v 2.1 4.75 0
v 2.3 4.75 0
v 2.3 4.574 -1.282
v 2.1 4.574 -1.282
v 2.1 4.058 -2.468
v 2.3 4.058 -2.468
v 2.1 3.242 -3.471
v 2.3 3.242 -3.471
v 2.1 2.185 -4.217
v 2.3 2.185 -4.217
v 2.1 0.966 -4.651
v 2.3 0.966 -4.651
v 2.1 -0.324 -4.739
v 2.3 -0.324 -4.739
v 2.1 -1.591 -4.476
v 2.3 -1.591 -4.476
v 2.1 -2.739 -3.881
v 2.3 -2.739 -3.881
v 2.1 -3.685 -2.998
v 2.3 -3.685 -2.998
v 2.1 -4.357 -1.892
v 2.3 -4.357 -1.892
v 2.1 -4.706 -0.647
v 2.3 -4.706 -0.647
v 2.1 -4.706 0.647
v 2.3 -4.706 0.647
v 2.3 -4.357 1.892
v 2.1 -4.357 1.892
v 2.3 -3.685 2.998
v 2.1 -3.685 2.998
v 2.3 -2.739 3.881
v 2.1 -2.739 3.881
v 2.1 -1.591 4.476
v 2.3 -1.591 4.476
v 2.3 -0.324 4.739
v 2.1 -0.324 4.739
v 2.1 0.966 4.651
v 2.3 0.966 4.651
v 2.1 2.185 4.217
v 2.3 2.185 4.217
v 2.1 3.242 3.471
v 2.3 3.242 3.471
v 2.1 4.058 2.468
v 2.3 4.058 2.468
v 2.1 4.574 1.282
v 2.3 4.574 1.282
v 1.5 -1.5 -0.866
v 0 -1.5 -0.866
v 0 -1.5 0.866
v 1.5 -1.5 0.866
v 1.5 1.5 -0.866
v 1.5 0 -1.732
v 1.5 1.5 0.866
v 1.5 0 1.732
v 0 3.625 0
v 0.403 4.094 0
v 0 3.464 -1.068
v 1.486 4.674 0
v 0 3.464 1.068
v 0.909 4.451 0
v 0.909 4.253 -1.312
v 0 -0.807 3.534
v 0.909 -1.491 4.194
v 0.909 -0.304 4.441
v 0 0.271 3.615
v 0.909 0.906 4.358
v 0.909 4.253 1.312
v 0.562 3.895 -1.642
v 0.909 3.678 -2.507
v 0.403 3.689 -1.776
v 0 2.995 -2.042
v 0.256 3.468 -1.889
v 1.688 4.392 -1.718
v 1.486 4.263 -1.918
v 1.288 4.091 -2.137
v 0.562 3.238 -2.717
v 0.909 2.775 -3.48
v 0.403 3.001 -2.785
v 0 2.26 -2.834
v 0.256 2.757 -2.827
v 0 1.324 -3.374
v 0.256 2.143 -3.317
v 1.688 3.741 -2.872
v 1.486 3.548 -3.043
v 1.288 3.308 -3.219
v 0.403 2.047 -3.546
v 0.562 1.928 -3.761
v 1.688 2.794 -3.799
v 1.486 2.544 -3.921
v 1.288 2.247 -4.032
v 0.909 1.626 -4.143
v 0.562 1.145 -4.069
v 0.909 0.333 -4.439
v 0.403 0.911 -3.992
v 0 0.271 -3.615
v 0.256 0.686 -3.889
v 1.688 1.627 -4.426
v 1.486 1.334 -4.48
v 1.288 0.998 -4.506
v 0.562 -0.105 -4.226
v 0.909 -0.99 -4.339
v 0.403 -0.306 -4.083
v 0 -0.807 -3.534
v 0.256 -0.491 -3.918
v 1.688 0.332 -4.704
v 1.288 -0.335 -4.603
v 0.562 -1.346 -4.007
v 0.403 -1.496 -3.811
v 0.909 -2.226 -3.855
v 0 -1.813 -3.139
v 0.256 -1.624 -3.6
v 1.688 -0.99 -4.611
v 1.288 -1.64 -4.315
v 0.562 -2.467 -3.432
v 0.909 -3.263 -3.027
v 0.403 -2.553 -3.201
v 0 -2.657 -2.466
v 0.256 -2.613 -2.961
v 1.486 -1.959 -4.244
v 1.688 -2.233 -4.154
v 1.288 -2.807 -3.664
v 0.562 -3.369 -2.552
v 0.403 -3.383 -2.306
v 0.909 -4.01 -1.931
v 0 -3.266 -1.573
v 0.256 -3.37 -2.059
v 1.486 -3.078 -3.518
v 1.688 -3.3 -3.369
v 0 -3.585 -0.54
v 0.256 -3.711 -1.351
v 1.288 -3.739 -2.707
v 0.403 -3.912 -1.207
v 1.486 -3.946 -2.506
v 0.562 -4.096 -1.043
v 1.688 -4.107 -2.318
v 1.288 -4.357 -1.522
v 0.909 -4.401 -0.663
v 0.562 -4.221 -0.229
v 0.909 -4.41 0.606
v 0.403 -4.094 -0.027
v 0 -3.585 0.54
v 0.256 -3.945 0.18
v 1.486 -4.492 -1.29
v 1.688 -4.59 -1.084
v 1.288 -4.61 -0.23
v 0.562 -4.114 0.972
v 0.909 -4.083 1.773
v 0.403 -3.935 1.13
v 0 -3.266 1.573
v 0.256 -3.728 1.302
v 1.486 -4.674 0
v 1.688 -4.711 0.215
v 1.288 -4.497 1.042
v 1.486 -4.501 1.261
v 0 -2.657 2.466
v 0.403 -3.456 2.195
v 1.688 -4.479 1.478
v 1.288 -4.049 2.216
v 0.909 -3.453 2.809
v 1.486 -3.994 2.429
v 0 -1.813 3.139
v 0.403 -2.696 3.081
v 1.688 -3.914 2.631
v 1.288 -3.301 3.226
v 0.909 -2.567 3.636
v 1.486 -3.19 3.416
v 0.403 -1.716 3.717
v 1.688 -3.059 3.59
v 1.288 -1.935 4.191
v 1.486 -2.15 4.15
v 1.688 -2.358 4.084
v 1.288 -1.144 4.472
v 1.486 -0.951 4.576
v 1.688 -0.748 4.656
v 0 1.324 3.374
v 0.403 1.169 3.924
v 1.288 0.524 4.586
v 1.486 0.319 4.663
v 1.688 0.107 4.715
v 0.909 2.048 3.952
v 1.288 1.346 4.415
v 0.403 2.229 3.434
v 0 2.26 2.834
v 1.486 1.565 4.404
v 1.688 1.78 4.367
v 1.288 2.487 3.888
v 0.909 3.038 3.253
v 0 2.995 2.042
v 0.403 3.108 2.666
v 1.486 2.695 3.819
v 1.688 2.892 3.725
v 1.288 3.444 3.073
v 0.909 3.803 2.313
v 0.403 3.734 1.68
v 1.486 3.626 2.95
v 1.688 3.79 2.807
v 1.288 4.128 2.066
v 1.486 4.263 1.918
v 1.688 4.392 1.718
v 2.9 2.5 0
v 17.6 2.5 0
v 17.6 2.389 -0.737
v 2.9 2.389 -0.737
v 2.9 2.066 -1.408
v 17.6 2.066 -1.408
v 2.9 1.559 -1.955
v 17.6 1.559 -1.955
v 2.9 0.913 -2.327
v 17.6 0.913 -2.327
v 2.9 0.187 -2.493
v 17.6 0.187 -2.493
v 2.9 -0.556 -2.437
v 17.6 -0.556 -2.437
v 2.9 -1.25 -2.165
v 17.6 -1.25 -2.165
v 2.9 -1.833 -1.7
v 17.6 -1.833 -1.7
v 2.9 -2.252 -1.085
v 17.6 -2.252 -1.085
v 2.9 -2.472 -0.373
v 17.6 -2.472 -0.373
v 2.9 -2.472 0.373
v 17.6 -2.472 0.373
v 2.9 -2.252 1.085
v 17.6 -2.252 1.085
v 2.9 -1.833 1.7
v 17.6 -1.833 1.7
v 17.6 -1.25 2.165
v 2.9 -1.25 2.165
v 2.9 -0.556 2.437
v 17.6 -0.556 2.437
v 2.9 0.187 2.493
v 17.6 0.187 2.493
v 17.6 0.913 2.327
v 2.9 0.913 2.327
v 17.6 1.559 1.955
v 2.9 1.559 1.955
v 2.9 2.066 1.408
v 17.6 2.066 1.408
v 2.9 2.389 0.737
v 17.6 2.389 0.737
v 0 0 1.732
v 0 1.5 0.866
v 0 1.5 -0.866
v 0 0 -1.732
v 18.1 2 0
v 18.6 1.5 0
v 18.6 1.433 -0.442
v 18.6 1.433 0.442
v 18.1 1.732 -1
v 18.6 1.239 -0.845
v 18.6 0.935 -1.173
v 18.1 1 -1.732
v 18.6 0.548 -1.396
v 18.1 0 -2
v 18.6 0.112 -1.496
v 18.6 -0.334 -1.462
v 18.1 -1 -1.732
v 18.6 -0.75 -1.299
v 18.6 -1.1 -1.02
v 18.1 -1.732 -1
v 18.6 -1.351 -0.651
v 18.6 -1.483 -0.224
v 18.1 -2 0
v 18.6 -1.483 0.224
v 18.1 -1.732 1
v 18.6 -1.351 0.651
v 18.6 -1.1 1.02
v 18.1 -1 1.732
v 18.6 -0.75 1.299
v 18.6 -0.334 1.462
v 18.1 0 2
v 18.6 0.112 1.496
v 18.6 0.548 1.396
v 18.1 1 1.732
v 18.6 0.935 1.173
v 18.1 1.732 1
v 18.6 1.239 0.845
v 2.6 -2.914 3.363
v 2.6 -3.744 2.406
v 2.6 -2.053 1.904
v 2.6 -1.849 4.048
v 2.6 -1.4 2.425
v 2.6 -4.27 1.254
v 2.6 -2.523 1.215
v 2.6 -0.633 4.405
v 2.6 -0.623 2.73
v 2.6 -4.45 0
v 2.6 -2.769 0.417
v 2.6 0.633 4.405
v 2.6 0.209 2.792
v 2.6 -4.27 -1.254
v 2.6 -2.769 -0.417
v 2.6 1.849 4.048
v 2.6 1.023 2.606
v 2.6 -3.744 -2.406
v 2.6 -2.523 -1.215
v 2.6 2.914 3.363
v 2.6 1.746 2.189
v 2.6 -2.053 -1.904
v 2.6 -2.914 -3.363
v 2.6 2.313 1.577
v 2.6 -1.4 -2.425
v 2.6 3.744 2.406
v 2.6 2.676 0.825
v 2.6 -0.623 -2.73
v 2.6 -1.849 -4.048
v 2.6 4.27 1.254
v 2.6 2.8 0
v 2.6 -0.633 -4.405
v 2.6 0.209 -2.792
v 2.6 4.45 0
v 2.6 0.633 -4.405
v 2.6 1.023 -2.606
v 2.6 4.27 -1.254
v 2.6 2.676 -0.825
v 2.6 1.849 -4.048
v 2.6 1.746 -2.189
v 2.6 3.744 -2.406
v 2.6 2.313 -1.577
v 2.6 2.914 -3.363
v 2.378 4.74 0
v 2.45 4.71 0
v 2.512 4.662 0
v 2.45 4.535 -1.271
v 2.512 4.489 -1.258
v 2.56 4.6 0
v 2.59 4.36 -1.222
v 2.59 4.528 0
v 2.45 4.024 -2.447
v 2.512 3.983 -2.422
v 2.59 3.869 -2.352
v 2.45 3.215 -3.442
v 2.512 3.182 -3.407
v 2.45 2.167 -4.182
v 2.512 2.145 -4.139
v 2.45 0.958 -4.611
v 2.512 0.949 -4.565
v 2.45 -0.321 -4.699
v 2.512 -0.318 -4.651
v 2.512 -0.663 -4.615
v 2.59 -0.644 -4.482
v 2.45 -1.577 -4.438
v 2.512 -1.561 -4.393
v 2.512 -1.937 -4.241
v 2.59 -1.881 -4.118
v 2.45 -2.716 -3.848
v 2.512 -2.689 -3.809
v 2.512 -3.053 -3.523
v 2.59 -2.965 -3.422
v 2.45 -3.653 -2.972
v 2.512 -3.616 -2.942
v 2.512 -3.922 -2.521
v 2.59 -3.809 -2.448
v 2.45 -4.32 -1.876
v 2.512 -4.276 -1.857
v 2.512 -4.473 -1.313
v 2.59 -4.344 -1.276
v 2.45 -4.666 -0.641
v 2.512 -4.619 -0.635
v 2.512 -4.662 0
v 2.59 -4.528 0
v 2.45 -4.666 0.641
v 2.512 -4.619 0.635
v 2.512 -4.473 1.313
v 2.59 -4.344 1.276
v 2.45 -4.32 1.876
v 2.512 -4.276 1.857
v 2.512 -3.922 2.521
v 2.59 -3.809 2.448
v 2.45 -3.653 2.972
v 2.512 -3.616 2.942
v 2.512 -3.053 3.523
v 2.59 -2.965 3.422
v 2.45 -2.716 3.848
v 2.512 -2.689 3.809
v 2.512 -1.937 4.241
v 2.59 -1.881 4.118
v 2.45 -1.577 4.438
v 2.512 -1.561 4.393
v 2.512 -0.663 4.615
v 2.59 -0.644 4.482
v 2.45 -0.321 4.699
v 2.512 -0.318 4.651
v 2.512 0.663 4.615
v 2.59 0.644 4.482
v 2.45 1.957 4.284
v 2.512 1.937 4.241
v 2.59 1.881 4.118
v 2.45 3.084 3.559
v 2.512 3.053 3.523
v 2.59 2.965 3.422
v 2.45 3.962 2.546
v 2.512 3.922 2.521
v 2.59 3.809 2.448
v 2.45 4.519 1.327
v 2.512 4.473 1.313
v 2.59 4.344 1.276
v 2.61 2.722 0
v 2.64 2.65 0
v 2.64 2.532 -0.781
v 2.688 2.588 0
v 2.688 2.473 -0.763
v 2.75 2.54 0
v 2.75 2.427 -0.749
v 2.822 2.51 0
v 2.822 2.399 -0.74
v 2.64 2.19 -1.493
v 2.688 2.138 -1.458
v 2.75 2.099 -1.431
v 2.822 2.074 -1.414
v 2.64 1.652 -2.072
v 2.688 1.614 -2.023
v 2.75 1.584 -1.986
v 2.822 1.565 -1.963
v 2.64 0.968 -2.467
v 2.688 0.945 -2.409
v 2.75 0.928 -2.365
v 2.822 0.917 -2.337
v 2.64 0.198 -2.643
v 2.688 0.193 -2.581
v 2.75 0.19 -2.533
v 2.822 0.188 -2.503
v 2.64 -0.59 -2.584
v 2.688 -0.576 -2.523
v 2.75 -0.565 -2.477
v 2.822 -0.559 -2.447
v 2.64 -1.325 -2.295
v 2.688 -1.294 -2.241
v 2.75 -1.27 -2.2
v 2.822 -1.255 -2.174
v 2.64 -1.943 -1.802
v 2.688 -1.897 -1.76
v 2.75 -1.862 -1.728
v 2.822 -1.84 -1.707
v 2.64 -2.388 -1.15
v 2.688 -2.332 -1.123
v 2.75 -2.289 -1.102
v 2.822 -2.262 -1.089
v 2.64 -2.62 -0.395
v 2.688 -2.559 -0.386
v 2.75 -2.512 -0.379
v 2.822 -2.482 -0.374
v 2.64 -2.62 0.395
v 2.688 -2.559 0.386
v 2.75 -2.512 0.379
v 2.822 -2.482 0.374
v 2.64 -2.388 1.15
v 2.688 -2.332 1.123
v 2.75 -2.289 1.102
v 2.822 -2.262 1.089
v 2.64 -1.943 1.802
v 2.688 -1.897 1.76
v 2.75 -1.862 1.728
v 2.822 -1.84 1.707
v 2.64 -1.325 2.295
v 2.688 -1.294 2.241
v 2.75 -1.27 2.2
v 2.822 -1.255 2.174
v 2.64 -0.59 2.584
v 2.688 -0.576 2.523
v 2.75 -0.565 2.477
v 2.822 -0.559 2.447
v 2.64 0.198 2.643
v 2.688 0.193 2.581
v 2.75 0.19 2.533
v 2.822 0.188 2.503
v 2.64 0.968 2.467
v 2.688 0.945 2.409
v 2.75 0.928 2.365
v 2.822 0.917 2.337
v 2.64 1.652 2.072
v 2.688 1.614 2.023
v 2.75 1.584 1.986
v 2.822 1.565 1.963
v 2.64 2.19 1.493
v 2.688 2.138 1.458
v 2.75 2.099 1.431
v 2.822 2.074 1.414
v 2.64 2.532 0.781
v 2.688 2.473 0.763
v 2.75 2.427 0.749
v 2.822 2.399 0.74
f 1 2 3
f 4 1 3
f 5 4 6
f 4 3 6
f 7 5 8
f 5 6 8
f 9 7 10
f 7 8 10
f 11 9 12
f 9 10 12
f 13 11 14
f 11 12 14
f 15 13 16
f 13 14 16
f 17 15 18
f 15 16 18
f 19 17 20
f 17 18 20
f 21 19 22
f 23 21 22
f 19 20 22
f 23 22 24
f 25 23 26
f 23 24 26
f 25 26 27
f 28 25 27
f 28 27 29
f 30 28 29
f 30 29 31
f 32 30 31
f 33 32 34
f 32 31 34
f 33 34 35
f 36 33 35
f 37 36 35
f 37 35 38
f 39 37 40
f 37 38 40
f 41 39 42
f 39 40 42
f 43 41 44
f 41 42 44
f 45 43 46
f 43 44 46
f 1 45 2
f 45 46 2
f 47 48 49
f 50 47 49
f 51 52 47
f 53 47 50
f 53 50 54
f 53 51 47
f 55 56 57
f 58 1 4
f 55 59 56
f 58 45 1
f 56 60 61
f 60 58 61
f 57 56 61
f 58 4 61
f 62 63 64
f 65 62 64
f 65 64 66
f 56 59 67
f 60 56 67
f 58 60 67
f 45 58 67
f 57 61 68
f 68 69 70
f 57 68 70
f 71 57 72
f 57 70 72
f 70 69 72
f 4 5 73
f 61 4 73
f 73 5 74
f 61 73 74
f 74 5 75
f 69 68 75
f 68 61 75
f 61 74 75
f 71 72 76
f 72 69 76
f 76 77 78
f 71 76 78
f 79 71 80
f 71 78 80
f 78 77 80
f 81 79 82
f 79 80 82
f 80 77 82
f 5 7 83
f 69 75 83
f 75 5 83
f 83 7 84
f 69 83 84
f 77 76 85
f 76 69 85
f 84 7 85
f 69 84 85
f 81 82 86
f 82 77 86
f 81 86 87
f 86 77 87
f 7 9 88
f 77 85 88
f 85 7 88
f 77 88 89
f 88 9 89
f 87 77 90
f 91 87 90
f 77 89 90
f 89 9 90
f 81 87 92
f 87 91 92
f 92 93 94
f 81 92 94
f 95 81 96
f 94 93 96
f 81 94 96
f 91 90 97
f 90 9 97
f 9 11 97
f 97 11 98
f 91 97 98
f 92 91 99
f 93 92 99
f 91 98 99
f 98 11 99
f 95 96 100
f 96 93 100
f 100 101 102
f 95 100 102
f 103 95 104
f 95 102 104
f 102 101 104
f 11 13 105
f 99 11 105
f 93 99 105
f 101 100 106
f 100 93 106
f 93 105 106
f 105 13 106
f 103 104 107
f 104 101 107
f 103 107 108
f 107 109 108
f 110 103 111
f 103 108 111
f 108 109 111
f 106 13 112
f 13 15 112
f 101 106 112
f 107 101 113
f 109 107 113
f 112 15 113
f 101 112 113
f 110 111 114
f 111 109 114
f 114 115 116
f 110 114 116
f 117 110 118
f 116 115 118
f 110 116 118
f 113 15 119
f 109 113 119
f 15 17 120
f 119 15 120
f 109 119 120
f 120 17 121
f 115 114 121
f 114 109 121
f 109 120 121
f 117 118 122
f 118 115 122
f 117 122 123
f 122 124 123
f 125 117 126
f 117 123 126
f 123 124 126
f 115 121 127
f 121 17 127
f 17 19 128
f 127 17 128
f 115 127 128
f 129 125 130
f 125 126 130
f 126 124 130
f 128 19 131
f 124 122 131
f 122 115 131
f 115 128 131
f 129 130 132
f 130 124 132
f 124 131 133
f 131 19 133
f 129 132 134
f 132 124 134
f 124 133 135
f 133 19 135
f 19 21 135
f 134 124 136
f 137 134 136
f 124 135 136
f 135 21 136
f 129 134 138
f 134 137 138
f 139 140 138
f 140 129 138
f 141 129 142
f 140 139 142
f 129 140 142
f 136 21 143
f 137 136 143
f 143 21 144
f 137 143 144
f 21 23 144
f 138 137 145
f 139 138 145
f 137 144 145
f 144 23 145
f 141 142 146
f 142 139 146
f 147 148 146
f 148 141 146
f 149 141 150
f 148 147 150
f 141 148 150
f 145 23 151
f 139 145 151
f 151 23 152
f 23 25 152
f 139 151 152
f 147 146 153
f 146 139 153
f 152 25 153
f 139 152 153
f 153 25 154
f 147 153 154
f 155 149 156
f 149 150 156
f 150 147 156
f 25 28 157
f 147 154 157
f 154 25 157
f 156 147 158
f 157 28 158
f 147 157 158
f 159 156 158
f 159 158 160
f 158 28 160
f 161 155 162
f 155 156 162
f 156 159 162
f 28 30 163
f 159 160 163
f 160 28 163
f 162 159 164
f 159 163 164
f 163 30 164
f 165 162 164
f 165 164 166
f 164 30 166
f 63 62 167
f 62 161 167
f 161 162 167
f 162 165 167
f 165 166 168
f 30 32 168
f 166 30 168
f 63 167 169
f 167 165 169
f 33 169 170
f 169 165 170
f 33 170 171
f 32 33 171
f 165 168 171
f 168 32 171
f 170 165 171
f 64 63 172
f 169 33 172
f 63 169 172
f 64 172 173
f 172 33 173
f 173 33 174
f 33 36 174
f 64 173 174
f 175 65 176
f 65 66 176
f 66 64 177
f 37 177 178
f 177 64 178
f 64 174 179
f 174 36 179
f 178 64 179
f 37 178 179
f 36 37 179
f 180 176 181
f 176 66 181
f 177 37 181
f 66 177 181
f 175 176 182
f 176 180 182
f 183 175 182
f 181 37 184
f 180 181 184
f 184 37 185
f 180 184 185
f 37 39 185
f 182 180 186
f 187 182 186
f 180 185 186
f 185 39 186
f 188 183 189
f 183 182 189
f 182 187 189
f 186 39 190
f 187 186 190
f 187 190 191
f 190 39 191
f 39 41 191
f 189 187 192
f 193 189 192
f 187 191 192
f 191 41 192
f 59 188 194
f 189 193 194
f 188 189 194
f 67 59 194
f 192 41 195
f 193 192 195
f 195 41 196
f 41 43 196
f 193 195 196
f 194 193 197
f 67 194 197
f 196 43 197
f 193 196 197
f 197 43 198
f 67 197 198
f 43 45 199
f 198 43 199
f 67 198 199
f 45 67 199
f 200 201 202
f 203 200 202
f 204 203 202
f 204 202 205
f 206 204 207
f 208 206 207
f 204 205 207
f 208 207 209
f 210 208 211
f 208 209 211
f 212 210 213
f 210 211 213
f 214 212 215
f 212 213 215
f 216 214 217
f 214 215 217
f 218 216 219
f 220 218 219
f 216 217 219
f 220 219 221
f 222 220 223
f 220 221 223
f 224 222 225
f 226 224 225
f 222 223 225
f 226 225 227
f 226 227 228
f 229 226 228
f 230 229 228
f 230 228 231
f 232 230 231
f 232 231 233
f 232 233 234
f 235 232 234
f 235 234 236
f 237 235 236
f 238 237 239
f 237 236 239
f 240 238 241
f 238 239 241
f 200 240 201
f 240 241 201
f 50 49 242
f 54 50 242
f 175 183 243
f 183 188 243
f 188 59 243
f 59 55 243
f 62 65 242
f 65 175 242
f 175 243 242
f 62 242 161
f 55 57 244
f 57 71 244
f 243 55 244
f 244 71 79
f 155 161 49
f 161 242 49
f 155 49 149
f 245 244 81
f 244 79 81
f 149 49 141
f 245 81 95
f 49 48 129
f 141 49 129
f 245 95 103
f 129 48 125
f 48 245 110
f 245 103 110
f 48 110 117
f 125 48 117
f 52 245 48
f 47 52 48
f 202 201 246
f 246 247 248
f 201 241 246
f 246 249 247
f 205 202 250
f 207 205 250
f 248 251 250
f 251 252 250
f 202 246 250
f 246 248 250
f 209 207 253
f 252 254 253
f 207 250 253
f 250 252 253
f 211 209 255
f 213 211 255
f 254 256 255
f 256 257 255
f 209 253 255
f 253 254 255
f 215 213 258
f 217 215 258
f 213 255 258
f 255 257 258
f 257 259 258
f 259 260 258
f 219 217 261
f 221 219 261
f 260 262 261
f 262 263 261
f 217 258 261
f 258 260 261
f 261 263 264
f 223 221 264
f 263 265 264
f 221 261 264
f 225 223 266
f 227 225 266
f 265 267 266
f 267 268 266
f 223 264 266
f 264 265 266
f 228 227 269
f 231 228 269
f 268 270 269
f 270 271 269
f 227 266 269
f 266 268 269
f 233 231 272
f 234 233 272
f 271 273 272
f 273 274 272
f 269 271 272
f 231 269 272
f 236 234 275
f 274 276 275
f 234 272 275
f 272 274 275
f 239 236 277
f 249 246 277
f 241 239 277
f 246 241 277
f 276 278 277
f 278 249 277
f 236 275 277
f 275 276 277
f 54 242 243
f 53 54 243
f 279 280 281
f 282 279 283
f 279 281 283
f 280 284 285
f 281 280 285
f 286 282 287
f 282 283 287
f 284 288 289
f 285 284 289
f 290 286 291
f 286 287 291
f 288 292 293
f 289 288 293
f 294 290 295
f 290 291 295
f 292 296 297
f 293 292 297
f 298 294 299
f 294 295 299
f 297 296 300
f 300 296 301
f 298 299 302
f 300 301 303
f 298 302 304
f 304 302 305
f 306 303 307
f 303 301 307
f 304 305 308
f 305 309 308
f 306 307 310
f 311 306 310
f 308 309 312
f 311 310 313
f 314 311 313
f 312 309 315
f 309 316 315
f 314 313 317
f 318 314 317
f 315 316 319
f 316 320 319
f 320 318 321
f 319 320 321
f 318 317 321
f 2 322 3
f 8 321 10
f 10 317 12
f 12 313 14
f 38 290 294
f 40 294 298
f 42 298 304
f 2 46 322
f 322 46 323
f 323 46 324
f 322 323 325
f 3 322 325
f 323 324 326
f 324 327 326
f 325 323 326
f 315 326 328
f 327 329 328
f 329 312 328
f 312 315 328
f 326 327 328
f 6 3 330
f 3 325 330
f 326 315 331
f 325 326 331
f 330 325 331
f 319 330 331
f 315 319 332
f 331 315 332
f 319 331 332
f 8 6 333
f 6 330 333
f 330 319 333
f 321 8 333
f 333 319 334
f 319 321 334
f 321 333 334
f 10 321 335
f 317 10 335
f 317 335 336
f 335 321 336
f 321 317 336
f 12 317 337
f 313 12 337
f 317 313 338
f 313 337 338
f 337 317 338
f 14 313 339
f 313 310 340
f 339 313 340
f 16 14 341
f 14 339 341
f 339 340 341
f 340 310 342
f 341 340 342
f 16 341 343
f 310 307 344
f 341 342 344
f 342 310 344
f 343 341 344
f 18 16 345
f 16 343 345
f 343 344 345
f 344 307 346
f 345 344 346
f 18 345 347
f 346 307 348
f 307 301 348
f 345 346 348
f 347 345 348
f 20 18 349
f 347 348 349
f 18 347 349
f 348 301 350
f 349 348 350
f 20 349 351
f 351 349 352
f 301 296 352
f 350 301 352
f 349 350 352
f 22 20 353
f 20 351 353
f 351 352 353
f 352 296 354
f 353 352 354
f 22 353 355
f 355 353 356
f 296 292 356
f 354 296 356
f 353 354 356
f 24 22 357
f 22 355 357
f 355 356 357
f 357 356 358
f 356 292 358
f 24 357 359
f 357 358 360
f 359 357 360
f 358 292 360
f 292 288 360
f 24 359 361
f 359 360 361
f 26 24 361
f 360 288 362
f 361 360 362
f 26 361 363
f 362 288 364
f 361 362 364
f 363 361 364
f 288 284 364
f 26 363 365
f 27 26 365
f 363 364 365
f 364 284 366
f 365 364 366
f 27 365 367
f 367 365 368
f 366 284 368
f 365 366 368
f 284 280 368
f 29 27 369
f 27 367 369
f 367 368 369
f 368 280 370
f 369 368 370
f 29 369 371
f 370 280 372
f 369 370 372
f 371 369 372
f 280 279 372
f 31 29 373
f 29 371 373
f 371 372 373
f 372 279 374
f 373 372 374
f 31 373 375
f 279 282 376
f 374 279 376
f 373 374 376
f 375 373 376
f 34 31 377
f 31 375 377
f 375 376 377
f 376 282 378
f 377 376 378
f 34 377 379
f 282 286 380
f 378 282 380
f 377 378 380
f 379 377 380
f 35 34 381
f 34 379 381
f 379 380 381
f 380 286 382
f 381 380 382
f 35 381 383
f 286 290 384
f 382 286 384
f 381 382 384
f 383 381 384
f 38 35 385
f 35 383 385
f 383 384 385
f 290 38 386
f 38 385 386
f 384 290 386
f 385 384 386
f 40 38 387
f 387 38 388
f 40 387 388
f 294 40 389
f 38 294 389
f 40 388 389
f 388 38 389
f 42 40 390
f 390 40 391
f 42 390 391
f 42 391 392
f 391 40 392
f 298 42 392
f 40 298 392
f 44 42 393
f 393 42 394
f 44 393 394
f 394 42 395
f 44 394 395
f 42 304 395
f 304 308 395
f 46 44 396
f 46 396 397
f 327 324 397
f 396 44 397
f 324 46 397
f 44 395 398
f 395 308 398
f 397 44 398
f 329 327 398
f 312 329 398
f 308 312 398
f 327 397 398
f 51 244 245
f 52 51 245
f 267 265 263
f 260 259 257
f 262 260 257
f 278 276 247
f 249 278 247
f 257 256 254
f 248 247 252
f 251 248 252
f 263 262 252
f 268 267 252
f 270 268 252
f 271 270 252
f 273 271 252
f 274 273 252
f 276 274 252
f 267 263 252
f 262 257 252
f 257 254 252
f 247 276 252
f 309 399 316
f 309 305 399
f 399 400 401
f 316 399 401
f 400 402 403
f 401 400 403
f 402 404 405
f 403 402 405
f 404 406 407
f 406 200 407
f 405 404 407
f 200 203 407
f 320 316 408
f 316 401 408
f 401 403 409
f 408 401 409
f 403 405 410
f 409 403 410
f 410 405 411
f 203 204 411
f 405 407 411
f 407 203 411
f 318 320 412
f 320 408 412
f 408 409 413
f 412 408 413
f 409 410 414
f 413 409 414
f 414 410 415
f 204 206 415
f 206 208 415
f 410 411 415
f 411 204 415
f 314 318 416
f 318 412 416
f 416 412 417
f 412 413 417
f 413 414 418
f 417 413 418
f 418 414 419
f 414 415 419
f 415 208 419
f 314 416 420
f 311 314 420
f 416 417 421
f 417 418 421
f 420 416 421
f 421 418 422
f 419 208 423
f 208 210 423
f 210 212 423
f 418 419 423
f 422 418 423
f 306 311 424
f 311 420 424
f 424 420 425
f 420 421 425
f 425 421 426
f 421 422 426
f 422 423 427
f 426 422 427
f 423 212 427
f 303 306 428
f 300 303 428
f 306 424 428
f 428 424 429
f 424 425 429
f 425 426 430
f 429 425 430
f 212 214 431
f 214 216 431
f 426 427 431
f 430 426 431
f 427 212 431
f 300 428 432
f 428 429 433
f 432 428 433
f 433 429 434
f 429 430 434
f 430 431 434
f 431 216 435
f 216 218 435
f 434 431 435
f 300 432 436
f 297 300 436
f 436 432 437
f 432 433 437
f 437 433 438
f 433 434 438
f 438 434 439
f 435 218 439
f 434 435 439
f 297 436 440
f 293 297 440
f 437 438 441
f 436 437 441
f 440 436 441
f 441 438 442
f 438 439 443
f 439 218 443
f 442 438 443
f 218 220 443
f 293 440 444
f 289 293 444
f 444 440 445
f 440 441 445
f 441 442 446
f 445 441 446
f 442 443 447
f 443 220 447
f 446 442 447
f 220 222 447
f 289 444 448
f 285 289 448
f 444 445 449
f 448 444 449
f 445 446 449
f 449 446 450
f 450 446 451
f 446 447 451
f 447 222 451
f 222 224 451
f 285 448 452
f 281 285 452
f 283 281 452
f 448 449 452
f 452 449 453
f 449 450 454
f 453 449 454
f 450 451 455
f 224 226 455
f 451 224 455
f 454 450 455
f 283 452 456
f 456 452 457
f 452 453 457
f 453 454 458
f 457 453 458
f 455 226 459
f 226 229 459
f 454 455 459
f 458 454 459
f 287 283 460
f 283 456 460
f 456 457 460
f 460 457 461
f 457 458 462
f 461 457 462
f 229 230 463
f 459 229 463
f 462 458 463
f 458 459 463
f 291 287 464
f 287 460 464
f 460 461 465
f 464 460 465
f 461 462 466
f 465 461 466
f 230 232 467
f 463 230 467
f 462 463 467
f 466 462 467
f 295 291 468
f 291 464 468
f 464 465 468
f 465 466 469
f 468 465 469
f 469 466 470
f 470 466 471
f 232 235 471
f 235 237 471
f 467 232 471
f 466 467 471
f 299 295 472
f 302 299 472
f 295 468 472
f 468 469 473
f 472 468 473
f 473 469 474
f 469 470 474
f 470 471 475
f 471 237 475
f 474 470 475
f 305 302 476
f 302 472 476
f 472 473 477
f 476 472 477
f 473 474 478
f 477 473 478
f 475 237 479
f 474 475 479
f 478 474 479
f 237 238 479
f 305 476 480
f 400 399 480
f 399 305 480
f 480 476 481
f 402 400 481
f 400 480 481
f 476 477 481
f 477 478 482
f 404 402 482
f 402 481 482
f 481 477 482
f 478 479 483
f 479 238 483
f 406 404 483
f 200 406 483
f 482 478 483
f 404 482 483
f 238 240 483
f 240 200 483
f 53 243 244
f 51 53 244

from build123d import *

# Parameters (mm, degrees)
CUT_EXTRUDE_1_DEPTH = 1.5
FILLET_1_R          = 0.3
CHAMFER_1_SIZE      = 1


with BuildPart() as part:
    # Эскиз1 → Повернуть1 (revolve)
    with BuildSketch(Plane.XY):
        with BuildLine():
            Line((0, 0), (0, 3.625))
            ThreePointArc((0, 3.625), (0.908821487, 4.451033224), (2.1, 4.75))
            Line((2.1, 4.75), (2.6, 4.75))
            Line((2.6, 4.75), (2.6, 2.5))
            Line((2.6, 2.5), (18.6, 2.5))
            Line((18.6, 2.5), (18.6, 0))
            Line((18.6, 0), (0, 0))
        make_face()
    revolve(axis=Axis((18.6, 0, 0), (-1, 0, 0)))

    # Эскиз2 → Вырез-Вытянуть1 (cut)
    with BuildSketch(Plane.ZY):
        Polygon((0.866025404, 1.5), (-0.866025404, 1.5), (-1.732050808, 0), (-0.866025404, -1.5), (0.866025404, -1.5), (1.732050808, 0), align=None)
    extrude(amount=-CUT_EXTRUDE_1_DEPTH, mode=Mode.SUBTRACT)

    # Скругление1
    fillet_1_edges = [part.edges().sort_by_distance(p)[0] for p in [
        (2.6, -2.5, 0),
        (2.6, -4.75, 0),
    ]]
    fillet(fillet_1_edges, radius=FILLET_1_R)

    # Фаска1
    chamfer_1_edges = [part.edges().sort_by_distance(p)[0] for p in [
        (18.6, -2.5, 0),
    ]]
    chamfer(chamfer_1_edges, length=CHAMFER_1_SIZE)


solid = part.part
